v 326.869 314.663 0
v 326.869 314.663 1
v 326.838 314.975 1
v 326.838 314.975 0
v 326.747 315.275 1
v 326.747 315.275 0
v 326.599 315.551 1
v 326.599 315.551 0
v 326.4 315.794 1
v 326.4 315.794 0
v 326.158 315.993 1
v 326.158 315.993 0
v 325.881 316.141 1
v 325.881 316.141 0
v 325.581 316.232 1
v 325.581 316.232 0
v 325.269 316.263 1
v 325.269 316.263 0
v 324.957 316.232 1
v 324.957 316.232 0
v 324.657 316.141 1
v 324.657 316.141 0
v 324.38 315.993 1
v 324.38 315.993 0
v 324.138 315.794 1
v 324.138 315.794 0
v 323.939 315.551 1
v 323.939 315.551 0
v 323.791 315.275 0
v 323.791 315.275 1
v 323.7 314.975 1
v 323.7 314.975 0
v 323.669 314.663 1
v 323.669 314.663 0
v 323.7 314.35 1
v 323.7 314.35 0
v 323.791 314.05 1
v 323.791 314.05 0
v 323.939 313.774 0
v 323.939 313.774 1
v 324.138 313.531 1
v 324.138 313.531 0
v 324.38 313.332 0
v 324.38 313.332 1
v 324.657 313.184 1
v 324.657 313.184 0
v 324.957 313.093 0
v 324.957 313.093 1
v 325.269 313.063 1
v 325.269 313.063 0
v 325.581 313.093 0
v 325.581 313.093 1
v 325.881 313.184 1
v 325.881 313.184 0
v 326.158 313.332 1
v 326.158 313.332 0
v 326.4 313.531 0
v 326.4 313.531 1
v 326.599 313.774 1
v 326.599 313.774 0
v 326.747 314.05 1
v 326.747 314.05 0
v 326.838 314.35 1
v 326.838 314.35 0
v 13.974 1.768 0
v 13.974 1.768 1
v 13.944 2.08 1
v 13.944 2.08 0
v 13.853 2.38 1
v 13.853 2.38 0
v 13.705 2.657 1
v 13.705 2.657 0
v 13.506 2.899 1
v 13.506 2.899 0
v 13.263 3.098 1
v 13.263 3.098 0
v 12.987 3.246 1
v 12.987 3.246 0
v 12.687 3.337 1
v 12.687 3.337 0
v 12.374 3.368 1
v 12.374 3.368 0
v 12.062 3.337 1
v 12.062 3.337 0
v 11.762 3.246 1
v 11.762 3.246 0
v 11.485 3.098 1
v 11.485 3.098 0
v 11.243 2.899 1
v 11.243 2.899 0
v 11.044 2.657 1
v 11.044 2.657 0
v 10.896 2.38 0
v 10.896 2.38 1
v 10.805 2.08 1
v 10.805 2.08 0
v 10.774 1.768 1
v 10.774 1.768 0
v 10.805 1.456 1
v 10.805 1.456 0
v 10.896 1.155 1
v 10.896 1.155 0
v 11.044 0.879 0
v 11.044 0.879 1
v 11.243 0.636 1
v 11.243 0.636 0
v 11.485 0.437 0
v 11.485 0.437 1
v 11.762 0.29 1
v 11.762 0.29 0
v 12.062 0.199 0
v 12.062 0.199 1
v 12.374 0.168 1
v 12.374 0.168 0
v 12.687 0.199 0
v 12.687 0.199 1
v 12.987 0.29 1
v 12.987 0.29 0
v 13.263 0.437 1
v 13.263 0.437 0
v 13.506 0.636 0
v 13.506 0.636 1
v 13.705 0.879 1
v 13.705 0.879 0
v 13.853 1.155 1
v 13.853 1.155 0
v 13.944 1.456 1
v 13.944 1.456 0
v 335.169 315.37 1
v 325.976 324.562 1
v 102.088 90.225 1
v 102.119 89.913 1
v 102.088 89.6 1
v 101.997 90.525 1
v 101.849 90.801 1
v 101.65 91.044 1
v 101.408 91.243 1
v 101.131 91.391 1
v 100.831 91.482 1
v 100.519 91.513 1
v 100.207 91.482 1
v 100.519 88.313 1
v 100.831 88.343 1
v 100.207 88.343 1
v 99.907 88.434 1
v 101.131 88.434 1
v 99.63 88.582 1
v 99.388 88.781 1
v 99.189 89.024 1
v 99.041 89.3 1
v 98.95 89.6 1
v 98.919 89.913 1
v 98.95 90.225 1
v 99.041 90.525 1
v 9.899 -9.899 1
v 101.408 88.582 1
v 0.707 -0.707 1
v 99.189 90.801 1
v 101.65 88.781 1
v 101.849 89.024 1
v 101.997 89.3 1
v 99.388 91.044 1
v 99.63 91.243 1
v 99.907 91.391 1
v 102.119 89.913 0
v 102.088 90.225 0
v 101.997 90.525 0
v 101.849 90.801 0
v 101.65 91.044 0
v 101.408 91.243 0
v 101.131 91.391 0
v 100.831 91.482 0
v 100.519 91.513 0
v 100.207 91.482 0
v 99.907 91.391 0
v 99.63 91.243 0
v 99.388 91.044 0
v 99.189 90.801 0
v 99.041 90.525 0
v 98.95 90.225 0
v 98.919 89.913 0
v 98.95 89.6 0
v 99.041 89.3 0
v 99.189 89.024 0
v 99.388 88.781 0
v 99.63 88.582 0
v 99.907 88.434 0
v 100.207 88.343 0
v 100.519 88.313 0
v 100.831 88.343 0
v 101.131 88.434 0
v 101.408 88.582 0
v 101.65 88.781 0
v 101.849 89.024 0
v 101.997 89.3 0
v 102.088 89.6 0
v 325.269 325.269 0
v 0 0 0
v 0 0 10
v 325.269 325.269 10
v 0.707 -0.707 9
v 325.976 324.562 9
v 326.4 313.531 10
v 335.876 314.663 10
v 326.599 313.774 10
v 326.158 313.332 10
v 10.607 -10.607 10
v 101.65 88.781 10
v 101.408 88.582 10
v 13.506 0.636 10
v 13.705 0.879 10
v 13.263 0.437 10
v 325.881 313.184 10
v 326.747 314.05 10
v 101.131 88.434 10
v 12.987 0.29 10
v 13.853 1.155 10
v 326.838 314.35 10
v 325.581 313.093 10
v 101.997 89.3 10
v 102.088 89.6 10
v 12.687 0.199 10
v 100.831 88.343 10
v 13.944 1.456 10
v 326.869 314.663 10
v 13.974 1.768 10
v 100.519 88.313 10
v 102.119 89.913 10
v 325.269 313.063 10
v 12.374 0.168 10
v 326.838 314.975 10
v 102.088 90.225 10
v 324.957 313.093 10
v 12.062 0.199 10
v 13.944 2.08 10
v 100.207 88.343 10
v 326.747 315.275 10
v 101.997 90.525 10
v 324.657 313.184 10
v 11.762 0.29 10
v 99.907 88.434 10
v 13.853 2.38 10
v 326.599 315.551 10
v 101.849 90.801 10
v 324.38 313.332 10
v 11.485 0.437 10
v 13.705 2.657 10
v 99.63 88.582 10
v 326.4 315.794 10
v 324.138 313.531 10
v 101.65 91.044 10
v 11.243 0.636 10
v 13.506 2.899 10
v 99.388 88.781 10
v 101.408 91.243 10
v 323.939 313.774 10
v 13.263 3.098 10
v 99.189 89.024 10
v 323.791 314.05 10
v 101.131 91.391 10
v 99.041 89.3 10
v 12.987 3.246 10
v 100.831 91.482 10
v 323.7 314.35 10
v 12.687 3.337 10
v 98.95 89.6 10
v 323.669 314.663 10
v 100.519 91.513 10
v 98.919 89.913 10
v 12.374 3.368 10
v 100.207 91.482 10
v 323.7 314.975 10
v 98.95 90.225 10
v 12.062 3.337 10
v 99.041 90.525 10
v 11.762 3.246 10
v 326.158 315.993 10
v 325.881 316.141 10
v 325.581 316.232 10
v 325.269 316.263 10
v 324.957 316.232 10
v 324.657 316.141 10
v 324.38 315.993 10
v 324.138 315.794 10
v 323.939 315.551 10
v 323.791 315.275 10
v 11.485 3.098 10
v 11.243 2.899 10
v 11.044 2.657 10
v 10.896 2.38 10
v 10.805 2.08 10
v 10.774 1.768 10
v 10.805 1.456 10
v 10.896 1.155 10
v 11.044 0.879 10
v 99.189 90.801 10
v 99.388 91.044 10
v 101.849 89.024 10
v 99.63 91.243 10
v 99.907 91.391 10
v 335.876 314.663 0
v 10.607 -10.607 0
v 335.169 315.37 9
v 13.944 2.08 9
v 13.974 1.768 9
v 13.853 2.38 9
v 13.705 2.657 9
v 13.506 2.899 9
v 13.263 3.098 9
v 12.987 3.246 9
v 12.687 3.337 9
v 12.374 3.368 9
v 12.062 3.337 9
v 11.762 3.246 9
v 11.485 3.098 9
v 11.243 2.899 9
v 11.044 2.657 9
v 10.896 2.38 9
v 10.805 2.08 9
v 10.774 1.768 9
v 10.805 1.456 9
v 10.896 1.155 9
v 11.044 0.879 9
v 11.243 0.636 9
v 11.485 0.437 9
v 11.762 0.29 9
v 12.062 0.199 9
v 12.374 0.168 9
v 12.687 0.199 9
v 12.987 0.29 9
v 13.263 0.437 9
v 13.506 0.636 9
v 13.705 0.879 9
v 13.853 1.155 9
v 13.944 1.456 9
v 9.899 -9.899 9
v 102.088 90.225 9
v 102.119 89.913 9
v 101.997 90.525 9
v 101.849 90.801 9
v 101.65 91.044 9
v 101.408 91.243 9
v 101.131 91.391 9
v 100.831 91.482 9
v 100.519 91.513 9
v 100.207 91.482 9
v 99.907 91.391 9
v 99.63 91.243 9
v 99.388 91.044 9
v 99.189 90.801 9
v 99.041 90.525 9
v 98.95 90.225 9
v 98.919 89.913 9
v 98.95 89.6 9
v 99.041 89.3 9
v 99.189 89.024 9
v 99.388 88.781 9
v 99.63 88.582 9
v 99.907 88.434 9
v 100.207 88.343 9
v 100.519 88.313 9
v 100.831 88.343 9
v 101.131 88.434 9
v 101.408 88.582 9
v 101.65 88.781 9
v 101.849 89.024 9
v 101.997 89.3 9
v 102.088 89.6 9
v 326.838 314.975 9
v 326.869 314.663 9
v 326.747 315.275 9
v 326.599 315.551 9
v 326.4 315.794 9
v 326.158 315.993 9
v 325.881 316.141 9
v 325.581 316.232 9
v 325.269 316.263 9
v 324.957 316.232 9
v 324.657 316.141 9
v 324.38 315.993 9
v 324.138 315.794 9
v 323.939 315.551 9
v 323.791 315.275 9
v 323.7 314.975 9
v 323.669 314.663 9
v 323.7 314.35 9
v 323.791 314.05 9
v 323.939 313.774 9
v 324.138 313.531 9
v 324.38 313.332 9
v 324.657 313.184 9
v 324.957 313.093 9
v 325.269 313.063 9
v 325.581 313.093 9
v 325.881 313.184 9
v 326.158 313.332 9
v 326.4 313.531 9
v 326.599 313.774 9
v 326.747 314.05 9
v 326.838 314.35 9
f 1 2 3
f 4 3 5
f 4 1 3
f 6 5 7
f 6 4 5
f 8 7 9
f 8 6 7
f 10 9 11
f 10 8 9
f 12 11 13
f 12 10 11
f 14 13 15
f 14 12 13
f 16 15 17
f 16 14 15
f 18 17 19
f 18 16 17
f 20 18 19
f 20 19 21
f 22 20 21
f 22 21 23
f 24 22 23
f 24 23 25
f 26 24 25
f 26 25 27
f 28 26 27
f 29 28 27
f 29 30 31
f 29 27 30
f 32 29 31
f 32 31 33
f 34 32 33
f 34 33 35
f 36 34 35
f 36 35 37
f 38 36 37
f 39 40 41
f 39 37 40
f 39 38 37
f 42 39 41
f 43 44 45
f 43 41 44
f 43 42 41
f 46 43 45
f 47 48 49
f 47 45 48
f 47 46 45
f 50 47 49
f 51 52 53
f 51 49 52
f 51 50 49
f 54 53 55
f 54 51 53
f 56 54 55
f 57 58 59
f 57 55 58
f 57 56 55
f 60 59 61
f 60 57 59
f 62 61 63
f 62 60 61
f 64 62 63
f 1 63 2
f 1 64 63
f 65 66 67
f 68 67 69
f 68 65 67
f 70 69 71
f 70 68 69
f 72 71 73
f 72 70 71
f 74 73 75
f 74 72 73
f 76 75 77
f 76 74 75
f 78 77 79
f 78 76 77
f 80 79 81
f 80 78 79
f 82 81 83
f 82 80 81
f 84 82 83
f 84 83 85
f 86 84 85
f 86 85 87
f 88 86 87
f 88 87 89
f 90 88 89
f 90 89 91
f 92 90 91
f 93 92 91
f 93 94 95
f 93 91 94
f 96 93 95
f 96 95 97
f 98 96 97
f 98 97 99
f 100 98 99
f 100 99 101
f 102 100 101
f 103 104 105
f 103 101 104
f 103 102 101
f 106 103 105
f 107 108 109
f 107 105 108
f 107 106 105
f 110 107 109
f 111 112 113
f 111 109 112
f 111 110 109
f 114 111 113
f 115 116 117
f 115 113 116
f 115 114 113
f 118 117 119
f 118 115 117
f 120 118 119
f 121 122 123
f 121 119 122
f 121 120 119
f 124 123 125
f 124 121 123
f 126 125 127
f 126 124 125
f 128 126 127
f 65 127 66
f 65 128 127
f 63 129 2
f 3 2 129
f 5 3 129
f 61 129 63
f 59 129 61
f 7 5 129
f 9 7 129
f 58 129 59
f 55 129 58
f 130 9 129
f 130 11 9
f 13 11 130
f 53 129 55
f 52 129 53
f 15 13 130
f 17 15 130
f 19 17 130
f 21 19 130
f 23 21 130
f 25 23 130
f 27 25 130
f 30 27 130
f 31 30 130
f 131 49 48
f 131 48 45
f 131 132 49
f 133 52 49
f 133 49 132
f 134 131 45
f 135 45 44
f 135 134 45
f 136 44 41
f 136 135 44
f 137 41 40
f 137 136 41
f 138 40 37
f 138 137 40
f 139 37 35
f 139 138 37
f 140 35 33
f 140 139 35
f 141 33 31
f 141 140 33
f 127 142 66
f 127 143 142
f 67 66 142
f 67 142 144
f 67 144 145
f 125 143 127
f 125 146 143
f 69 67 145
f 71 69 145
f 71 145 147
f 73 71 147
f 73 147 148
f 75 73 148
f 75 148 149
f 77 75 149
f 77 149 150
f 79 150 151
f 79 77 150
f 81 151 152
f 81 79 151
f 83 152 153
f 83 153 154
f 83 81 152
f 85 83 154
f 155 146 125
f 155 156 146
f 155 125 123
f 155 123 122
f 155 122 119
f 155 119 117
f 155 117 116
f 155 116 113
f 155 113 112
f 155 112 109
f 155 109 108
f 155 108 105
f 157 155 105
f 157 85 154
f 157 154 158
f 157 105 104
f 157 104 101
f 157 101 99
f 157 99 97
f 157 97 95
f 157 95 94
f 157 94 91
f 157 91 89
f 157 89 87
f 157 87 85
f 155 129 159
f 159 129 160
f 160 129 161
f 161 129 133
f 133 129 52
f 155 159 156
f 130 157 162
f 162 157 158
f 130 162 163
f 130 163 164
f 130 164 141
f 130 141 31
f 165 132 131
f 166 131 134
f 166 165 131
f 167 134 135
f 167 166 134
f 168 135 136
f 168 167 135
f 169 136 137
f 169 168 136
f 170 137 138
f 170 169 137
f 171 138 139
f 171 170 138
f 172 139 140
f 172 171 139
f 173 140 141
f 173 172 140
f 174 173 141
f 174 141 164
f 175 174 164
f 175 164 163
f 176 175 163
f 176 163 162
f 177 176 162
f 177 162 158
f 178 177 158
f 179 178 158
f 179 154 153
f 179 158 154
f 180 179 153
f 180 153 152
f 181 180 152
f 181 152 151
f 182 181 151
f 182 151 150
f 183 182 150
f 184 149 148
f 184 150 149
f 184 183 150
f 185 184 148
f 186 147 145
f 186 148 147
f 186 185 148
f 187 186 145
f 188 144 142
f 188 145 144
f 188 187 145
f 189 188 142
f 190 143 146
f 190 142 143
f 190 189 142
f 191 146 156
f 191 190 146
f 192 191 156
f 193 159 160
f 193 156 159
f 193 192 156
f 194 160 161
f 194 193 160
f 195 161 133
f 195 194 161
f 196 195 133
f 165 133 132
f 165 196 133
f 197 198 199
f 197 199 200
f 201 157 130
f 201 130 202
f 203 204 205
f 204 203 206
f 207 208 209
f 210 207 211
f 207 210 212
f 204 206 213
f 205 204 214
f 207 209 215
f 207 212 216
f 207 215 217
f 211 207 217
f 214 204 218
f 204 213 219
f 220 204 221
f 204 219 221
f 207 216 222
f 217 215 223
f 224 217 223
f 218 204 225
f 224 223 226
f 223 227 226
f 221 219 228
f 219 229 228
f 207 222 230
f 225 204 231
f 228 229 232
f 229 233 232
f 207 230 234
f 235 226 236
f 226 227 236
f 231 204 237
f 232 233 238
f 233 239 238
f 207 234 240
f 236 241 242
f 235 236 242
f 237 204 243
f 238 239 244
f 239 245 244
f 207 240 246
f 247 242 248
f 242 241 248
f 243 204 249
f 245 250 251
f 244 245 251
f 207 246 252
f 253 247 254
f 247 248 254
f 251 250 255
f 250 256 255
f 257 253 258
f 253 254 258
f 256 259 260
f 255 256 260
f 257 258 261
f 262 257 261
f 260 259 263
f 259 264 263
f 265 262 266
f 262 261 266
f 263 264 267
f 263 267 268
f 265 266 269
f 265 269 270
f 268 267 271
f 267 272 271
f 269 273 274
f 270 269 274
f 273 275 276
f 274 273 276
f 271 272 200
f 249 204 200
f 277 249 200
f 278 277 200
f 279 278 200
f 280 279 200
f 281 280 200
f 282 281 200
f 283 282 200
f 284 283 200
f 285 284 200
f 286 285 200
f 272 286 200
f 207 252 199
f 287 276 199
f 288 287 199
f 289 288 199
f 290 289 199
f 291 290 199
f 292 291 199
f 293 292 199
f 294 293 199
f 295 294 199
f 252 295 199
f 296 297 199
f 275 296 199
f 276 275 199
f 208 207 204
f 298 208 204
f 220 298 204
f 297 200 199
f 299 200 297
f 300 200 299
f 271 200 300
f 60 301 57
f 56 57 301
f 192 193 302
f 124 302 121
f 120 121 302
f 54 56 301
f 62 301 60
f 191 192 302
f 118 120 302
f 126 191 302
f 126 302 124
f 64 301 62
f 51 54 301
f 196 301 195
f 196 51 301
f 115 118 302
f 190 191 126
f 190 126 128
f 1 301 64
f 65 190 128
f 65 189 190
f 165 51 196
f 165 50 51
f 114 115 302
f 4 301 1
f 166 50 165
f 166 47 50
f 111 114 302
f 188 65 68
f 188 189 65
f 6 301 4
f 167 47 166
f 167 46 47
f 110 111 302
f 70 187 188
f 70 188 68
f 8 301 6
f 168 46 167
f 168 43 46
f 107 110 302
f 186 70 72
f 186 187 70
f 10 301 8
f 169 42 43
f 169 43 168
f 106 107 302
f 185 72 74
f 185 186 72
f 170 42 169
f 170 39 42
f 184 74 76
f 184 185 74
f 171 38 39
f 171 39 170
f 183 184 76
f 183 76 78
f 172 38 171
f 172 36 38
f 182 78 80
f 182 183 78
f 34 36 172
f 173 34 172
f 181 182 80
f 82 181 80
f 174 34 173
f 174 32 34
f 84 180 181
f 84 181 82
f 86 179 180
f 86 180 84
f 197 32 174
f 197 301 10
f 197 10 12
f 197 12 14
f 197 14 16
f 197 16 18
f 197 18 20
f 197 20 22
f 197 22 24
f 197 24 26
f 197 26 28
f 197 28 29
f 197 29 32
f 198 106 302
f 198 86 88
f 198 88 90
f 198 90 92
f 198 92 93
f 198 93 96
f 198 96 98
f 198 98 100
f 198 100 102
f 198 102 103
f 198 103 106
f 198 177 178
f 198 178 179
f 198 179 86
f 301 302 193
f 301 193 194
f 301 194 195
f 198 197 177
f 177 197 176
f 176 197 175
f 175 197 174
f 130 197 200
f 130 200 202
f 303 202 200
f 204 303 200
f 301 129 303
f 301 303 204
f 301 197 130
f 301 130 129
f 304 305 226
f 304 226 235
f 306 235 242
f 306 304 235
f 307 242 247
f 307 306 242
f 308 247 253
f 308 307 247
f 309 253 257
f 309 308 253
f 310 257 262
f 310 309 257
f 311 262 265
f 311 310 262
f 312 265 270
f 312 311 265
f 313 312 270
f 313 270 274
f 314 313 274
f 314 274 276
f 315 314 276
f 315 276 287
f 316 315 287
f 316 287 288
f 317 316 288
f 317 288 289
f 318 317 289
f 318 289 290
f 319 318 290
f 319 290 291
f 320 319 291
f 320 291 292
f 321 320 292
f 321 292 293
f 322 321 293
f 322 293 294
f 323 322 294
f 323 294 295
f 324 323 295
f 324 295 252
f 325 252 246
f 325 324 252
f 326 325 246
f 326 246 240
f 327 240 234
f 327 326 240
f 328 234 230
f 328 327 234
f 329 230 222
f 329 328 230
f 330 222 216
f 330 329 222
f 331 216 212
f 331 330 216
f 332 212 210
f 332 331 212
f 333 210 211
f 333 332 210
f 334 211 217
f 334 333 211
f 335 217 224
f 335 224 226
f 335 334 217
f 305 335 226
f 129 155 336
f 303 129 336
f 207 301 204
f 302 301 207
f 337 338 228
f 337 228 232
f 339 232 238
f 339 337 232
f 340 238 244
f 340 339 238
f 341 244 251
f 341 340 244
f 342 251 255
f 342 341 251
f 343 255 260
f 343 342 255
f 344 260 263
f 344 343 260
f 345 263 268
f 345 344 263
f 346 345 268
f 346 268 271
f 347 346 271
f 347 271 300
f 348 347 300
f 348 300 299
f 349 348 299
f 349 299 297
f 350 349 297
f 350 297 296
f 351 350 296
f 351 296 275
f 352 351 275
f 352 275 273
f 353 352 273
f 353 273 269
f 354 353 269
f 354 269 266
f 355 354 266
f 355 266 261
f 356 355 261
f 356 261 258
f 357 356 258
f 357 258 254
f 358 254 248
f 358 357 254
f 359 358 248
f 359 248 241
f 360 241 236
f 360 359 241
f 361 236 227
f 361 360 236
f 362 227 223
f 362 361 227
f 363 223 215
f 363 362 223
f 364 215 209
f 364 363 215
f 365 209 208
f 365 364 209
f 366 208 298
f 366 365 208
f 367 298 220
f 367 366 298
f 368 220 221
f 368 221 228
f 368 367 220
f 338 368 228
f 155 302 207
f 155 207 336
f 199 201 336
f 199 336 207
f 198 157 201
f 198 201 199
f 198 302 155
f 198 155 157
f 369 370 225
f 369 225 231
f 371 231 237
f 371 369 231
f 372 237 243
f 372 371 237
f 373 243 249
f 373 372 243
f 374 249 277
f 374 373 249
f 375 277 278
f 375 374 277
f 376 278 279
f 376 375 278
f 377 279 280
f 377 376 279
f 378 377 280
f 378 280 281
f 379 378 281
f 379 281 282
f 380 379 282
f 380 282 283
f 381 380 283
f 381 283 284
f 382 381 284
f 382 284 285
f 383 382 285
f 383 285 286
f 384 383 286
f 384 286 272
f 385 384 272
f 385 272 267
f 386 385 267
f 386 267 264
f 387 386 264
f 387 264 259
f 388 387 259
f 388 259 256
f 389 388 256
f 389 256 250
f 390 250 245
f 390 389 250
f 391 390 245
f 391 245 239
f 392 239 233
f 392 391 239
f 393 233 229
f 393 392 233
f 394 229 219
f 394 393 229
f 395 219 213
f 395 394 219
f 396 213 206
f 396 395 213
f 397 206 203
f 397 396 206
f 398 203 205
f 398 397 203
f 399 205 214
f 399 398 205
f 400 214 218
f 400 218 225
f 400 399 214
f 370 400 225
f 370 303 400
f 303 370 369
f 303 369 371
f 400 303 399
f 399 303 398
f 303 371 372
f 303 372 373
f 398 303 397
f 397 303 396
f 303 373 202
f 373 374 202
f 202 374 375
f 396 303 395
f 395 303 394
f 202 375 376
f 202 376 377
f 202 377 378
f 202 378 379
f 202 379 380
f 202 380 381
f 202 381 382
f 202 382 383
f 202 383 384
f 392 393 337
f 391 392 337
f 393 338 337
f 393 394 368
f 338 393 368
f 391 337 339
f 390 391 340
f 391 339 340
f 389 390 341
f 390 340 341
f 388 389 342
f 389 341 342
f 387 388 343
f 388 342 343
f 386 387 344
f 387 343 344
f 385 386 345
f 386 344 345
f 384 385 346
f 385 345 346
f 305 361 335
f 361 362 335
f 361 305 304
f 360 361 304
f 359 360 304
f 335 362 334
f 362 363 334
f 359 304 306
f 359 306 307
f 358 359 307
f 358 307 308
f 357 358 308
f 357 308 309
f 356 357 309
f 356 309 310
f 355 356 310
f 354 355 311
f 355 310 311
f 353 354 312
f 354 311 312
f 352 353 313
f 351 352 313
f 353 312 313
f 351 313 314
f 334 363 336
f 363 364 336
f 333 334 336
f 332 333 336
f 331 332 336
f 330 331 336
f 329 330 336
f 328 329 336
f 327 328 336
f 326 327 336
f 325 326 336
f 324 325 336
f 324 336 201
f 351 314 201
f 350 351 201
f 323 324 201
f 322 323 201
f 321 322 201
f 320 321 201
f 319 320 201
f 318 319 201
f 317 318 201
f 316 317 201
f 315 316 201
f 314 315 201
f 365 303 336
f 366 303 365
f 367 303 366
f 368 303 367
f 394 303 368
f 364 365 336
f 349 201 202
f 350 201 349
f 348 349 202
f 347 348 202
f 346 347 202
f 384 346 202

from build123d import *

# Parameters (mm, degrees)
SKETCH_1_R          = 1.6
EXTRUDE_1_DEPTH     = 10
SKETCH_2_W          = 8
SKETCH_2_H          = 13
CUT_EXTRUDE_1_DEPTH = 1000


with BuildPart() as part:
    # ｽｹｯﾁ1 → ﾎﾞｽ - 押し出し1 (new body)
    with BuildSketch(Plane.XY):
        Polygon((325.269119346, 325.269119346), (335.875721064, 314.662517628), (10.606601718, -10.606601718), (0, 0), align=None)
        with Locations((100.519119346, 89.912517628)):
            Circle(SKETCH_1_R, mode=Mode.SUBTRACT)
        with Locations((12.374368671, 1.767766953)):
            Circle(SKETCH_1_R, mode=Mode.SUBTRACT)
        with Locations((325.269119346, 314.662517628)):
            Circle(SKETCH_1_R, mode=Mode.SUBTRACT)
    extrude(amount=EXTRUDE_1_DEPTH)

    # ｽｹｯﾁ2 → ｶｯﾄ - 押し出し1 (cut)
    with BuildSketch(Plane(origin=(0, 0, 0), x_dir=(0, 0, 1), z_dir=(-0.7071067811865517, -0.7071067811865435, 0))):
        with Locations((5, -7.5)):
            Rectangle(SKETCH_2_W, SKETCH_2_H)
    extrude(amount=-CUT_EXTRUDE_1_DEPTH, mode=Mode.SUBTRACT)


solid = part.part
